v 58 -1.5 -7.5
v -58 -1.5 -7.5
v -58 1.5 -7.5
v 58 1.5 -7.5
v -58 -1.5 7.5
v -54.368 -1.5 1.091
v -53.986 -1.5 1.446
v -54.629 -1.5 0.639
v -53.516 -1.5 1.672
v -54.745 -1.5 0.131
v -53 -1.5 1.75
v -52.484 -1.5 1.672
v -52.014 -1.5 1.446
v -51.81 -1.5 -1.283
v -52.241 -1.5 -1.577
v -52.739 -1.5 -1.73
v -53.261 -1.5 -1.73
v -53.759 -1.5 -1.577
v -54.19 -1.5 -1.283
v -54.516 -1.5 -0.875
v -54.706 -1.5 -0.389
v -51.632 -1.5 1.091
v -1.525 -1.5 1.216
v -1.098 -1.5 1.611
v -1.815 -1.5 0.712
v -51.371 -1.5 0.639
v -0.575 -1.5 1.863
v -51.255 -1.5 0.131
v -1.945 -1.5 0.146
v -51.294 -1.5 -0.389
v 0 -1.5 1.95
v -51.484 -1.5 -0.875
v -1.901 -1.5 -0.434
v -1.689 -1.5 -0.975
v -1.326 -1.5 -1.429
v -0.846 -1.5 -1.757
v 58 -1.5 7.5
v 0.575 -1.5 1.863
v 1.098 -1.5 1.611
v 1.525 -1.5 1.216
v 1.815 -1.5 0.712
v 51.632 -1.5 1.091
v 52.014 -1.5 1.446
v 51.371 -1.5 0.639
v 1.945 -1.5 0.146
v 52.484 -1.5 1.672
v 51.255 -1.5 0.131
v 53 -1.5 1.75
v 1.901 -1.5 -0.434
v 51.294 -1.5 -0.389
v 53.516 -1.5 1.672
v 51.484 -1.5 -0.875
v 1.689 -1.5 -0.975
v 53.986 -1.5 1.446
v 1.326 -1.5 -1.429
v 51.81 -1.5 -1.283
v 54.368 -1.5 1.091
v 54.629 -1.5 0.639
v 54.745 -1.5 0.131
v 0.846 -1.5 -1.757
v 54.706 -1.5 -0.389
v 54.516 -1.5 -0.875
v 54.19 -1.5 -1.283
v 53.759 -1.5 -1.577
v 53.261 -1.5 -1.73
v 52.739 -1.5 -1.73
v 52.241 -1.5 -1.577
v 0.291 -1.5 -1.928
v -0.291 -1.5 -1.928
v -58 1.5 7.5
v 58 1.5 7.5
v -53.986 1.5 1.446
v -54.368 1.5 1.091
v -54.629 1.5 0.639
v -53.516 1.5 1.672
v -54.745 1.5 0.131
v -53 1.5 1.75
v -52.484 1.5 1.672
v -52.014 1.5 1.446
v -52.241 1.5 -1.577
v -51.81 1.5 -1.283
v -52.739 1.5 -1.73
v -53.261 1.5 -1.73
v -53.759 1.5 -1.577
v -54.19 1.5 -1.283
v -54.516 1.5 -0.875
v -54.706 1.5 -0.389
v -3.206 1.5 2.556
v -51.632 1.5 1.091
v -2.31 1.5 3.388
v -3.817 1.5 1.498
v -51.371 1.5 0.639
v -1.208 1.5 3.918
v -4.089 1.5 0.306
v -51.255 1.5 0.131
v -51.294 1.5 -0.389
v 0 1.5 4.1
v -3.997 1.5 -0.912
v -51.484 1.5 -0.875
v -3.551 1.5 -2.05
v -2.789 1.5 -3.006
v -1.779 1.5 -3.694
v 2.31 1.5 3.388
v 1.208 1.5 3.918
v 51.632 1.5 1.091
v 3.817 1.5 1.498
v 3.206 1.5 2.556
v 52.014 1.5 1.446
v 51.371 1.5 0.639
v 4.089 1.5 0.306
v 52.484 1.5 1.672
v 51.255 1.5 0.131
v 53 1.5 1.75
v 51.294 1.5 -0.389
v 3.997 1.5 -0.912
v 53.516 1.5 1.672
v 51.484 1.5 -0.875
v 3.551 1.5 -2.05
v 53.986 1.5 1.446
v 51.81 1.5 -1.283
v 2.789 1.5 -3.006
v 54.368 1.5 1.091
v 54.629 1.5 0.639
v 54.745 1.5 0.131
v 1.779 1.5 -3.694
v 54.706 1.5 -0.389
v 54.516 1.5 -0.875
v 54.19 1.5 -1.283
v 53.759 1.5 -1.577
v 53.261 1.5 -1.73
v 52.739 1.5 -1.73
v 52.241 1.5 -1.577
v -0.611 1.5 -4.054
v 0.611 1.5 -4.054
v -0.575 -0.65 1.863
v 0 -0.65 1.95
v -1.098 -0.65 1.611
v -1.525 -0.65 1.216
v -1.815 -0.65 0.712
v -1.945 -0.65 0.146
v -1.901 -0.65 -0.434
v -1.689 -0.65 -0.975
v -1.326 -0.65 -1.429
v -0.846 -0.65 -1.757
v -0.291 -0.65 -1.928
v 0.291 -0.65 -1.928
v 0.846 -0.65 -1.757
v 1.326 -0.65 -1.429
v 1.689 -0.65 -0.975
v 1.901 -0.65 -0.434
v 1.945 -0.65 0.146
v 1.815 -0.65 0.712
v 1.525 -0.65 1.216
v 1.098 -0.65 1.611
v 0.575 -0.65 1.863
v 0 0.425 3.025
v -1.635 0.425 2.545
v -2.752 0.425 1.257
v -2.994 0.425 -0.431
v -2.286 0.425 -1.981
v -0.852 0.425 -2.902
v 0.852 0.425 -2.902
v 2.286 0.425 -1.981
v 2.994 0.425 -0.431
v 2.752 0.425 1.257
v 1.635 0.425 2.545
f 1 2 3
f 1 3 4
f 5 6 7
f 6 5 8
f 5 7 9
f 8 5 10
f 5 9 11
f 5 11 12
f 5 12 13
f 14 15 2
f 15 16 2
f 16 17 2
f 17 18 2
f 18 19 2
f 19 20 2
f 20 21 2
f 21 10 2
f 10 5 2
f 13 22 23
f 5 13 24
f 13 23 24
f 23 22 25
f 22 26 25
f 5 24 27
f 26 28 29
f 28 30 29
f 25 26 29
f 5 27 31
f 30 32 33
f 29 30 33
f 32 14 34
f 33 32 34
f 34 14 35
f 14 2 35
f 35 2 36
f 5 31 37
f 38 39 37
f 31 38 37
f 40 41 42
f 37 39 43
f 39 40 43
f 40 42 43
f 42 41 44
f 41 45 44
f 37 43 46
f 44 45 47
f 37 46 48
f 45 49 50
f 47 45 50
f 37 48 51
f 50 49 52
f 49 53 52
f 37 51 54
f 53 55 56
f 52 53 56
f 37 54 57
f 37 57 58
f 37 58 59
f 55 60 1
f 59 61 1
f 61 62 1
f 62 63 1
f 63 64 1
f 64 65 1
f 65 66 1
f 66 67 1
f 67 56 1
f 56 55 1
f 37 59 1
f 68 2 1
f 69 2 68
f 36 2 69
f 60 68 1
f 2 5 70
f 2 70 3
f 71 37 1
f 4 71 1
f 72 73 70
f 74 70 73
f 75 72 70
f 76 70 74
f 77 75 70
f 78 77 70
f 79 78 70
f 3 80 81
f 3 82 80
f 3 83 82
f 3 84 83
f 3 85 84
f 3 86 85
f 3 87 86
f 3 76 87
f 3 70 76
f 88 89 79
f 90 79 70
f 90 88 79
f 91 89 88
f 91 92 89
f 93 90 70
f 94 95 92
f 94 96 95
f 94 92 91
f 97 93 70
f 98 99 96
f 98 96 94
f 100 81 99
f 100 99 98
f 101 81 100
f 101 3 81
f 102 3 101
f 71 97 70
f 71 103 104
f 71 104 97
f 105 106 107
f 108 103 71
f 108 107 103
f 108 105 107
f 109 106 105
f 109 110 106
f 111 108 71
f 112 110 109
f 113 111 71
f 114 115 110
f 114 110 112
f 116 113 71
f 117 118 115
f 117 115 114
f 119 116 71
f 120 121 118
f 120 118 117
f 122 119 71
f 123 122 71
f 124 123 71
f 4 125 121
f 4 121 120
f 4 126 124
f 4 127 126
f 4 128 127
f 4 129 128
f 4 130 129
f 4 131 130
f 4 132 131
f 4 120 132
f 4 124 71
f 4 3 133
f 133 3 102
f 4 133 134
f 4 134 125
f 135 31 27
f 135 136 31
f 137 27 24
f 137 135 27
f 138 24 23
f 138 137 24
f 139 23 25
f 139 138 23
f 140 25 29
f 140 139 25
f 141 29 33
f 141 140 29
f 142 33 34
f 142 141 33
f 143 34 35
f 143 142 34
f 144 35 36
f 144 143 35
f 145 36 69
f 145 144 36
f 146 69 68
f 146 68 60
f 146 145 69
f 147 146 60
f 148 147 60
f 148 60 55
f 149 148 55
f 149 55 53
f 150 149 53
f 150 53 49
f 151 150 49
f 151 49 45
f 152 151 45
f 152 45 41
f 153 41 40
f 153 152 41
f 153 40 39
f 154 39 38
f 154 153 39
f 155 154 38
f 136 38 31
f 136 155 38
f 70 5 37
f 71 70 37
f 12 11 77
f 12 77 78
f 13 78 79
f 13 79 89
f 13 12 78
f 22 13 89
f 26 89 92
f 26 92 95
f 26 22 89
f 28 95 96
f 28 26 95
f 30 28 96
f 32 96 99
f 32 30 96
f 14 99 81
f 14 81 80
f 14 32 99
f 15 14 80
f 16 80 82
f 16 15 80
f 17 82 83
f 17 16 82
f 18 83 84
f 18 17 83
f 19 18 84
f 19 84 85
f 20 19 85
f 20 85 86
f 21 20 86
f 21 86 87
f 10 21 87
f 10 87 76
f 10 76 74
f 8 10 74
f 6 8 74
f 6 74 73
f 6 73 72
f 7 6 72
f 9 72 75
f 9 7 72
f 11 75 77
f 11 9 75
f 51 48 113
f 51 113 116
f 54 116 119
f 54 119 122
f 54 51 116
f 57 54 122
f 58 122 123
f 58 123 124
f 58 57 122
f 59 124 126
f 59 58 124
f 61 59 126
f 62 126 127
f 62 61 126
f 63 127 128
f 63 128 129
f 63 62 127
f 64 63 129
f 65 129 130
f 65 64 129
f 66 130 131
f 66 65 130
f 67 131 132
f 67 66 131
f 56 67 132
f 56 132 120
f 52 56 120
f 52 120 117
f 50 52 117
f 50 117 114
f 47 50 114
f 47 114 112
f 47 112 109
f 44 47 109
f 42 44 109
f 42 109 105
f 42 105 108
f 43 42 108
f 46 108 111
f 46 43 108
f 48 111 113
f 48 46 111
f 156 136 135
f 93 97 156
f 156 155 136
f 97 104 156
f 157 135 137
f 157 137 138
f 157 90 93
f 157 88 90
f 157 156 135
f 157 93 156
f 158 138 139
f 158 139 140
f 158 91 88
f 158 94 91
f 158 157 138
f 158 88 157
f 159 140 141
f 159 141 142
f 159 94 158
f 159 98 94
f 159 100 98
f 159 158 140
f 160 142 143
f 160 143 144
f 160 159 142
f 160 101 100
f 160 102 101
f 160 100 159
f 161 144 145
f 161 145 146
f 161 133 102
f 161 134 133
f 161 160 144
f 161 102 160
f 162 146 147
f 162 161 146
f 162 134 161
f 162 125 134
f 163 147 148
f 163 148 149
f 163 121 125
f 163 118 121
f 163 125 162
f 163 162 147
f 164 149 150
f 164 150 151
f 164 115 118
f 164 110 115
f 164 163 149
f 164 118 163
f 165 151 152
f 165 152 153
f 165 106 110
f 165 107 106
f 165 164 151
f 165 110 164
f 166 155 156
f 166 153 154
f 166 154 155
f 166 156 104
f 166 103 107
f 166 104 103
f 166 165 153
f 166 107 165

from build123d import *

# Parameters (mm, degrees)
EXTRUDE_1_DEPTH      = 1.5
EXTRUDE_1_DEPTH_BACK = 1.5
SKETCH_1_W           = 116
SKETCH_1_H           = 15
SKETCH_1_R           = 1.75


with BuildPart() as part:
    # Эскиз1 → Бобышка-Вытянуть1 (new, two sides: drawn at the far end of the back side and taken through both)
    with BuildSketch(Plane(origin=(0, 0, 0), x_dir=(1, 0, 0), z_dir=(0, 1, 0)).offset(-EXTRUDE_1_DEPTH_BACK)):
        Rectangle(SKETCH_1_W, SKETCH_1_H)
        with Locations((-53, 0)):
            Circle(SKETCH_1_R, mode=Mode.SUBTRACT)
        with BuildLine():
            ThreePointArc((1.75, 0), (0, -1.75), (-1.75, 0))
            ThreePointArc((-1.75, 0), (0, 1.75), (1.75, 0))
        make_face(mode=Mode.SUBTRACT)
        with BuildLine():
            ThreePointArc((54.75, 0), (53, -1.75), (51.25, 0))
            ThreePointArc((51.25, 0), (53, 1.75), (54.75, 0))
        make_face(mode=Mode.SUBTRACT)
    extrude(amount=EXTRUDE_1_DEPTH + EXTRUDE_1_DEPTH_BACK)

    # Эскиз2 → Зенковка для  винта с плоской головкой M3.51 (revolve, cut)
    with BuildSketch(Plane(origin=(0, 1.5, 0), x_dir=(0, 0, 1), z_dir=(1, 0, 0))):
        Polygon((0, 0), (0, 3), (1.95, 3), (1.95, 2.15), (4.1, 0), align=None)
    revolve(axis=Axis((0, 7.85, 0), (0, -1, 0)), mode=Mode.SUBTRACT)


solid = part.part
